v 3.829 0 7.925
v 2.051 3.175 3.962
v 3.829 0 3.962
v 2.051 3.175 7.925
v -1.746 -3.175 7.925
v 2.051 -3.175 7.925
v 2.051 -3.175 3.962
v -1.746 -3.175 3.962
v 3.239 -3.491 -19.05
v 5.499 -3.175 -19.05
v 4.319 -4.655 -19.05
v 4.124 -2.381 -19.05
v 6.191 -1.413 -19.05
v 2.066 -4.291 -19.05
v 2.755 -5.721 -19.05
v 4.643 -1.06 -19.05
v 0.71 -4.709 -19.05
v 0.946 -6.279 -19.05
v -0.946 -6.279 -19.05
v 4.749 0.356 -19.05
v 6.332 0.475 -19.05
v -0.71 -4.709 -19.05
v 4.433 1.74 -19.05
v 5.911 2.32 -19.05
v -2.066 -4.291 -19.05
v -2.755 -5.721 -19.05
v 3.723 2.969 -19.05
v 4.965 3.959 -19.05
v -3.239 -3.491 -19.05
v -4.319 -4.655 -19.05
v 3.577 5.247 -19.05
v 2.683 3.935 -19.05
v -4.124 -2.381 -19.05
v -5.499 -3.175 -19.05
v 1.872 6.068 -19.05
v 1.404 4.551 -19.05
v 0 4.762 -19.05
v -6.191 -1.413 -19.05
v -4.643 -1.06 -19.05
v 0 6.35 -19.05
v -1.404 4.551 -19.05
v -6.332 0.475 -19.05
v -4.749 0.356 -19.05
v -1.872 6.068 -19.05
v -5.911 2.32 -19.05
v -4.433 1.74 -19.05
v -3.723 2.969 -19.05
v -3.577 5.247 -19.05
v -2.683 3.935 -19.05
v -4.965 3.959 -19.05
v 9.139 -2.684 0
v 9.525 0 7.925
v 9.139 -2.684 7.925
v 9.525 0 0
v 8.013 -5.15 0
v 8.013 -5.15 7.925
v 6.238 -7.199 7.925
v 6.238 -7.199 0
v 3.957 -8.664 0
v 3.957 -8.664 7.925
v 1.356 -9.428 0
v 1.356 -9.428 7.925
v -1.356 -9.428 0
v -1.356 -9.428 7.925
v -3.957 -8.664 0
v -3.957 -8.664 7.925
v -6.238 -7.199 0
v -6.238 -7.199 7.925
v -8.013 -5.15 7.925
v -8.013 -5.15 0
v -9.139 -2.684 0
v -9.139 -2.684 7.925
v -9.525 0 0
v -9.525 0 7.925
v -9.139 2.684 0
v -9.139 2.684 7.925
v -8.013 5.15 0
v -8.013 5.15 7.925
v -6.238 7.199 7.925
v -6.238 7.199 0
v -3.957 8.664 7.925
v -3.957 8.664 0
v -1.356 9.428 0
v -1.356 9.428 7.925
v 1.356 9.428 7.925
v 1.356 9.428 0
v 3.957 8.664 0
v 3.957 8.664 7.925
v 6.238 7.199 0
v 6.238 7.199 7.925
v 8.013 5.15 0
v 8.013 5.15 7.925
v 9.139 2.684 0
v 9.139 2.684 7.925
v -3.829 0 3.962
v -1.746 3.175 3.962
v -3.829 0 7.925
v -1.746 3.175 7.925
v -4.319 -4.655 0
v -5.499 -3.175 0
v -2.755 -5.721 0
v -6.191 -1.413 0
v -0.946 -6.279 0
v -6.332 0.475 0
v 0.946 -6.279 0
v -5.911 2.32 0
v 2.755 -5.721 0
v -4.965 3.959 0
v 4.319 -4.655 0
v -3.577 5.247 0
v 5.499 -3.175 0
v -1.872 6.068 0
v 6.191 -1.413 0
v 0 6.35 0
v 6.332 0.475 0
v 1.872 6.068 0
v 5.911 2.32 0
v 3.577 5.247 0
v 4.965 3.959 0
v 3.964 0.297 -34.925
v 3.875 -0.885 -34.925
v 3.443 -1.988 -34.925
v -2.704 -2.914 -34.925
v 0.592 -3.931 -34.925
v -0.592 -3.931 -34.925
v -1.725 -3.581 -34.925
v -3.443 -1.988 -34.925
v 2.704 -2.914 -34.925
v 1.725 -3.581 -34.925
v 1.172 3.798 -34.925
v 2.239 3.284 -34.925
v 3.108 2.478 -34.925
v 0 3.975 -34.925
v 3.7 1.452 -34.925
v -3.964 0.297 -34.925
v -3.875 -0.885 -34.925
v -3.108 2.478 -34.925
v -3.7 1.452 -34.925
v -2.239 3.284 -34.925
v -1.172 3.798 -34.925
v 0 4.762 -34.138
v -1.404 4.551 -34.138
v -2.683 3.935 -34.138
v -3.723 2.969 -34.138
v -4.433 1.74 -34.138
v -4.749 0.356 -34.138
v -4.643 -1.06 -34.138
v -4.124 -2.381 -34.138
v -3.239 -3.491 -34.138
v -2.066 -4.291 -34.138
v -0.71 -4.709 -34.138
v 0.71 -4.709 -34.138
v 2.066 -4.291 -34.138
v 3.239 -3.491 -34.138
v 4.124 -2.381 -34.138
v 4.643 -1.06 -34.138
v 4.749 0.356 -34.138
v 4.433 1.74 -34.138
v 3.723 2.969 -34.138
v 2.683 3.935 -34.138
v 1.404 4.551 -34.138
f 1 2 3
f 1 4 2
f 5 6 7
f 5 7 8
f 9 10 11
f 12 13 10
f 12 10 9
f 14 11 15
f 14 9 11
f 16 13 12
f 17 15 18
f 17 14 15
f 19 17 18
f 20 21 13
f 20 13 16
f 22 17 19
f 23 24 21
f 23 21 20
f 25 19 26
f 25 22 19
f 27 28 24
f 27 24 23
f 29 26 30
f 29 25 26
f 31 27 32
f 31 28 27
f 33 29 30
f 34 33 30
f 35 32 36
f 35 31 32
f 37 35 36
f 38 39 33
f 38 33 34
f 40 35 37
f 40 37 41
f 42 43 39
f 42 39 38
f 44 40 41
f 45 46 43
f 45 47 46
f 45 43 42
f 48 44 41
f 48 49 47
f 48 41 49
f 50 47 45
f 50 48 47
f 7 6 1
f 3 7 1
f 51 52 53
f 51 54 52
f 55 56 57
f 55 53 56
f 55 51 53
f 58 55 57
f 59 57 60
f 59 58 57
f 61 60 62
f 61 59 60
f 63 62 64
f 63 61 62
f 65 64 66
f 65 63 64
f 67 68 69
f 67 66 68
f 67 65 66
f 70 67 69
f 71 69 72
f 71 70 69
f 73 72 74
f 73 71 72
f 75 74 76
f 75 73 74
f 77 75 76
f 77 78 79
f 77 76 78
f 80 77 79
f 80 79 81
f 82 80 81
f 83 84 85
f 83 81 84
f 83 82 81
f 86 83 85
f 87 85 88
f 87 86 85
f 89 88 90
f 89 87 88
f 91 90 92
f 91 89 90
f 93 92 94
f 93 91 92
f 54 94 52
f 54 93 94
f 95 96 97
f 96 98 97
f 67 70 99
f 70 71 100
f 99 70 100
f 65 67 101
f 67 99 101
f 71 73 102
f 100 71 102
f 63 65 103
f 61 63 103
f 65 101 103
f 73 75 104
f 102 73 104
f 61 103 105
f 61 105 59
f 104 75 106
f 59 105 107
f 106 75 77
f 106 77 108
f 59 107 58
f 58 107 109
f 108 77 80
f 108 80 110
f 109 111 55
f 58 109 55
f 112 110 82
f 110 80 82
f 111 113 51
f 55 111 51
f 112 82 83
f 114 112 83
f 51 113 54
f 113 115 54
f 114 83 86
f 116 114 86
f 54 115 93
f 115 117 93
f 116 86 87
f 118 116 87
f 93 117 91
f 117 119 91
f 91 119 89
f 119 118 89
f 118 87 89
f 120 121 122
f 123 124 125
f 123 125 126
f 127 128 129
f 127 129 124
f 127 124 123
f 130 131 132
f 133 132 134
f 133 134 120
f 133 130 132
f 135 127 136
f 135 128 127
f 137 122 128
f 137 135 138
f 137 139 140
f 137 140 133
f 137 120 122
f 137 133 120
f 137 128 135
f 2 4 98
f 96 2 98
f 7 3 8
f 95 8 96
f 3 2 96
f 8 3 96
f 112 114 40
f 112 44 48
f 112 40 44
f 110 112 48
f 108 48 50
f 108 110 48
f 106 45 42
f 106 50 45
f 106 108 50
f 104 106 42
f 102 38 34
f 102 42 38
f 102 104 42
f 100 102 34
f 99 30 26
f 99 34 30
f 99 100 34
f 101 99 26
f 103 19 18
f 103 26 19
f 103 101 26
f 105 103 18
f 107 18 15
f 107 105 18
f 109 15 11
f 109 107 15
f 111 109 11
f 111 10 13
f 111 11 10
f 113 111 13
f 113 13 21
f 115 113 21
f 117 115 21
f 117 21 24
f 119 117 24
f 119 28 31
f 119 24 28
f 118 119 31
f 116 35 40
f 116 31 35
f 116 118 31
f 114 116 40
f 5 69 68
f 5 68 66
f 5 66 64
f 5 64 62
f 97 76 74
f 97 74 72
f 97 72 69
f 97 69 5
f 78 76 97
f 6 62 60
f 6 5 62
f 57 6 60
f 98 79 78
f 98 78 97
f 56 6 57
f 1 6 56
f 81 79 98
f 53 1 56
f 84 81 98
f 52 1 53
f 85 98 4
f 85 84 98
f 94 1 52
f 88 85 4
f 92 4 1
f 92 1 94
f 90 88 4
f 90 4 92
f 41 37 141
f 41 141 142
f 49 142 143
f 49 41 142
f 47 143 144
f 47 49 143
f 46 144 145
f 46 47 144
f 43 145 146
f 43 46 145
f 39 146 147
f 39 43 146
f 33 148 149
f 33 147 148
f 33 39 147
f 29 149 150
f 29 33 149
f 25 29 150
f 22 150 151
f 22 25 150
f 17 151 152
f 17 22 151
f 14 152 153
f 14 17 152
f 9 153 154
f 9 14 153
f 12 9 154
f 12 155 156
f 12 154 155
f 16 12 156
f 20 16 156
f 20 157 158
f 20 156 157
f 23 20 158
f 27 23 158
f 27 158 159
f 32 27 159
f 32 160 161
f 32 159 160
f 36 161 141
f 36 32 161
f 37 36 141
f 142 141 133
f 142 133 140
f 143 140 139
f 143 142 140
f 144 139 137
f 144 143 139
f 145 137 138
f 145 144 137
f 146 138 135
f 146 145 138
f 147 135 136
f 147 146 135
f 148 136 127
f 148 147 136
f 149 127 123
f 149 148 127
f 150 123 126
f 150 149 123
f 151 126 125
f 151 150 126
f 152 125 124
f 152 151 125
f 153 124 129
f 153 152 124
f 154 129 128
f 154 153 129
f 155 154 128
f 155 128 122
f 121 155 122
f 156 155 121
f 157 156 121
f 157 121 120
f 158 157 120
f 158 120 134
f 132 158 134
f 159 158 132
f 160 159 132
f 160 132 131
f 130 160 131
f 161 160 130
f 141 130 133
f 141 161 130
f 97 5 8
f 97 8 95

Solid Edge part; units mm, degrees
sketch "Sketch1" plane through (0, 0, 0) normal (0, 0, 1) x (1, 0, 0)
  circle A0 centre (0, 0) radius 9.525
  dimension "D1" = 19.05
extrude "Protrusion1" add sketch "Sketch1" along normal blind 7.9248
sketch "Sketch2" plane through (0, 0, 0) normal (0, 0, -1) x (0, 1, 0)
  circle A0 centre (0, 0) radius 6.35
  dimension "D1" = 12.7
extrude "Protrusion2" add sketch "Sketch2" along normal blind 19.05
sketch "Sketch3" plane through (0, 0, -19.05) normal (0, 0, -1) x (0, 1, 0)
  circle A0 centre (0, 0) radius 4.7625
  dimension "D1" = 9.525
extrude "Protrusion3" add sketch "Sketch3" along normal blind 15.875
sketch "Sketch4" plane through (0, 0, 7.9248) normal (0, 0, 1) x (0, 1, 0)
  line L0 (-3.175, 1.7461) -> (0, 3.8287)
  line L1 (-3.175, -2.051) -> (-3.175, 1.7461)
  line L2 (-3.175, -2.051) -> (0, -3.8287)
  line L3 (3.175, -2.051) -> (0, -3.8287)
  line L4 (3.175, -2.051) -> (3.175, 1.7461)
  line L5 (3.175, 1.7461) -> (0, 3.8287)
  dimension "D1" = 6.35
extrude "Cutout1" cut sketch "Sketch4" against normal blind 3.9624
chamfer "Chamfer1" distance 0.7874 angle 45 1 edges at (0, -4.7625, -34.925)
properties part number "153181"
